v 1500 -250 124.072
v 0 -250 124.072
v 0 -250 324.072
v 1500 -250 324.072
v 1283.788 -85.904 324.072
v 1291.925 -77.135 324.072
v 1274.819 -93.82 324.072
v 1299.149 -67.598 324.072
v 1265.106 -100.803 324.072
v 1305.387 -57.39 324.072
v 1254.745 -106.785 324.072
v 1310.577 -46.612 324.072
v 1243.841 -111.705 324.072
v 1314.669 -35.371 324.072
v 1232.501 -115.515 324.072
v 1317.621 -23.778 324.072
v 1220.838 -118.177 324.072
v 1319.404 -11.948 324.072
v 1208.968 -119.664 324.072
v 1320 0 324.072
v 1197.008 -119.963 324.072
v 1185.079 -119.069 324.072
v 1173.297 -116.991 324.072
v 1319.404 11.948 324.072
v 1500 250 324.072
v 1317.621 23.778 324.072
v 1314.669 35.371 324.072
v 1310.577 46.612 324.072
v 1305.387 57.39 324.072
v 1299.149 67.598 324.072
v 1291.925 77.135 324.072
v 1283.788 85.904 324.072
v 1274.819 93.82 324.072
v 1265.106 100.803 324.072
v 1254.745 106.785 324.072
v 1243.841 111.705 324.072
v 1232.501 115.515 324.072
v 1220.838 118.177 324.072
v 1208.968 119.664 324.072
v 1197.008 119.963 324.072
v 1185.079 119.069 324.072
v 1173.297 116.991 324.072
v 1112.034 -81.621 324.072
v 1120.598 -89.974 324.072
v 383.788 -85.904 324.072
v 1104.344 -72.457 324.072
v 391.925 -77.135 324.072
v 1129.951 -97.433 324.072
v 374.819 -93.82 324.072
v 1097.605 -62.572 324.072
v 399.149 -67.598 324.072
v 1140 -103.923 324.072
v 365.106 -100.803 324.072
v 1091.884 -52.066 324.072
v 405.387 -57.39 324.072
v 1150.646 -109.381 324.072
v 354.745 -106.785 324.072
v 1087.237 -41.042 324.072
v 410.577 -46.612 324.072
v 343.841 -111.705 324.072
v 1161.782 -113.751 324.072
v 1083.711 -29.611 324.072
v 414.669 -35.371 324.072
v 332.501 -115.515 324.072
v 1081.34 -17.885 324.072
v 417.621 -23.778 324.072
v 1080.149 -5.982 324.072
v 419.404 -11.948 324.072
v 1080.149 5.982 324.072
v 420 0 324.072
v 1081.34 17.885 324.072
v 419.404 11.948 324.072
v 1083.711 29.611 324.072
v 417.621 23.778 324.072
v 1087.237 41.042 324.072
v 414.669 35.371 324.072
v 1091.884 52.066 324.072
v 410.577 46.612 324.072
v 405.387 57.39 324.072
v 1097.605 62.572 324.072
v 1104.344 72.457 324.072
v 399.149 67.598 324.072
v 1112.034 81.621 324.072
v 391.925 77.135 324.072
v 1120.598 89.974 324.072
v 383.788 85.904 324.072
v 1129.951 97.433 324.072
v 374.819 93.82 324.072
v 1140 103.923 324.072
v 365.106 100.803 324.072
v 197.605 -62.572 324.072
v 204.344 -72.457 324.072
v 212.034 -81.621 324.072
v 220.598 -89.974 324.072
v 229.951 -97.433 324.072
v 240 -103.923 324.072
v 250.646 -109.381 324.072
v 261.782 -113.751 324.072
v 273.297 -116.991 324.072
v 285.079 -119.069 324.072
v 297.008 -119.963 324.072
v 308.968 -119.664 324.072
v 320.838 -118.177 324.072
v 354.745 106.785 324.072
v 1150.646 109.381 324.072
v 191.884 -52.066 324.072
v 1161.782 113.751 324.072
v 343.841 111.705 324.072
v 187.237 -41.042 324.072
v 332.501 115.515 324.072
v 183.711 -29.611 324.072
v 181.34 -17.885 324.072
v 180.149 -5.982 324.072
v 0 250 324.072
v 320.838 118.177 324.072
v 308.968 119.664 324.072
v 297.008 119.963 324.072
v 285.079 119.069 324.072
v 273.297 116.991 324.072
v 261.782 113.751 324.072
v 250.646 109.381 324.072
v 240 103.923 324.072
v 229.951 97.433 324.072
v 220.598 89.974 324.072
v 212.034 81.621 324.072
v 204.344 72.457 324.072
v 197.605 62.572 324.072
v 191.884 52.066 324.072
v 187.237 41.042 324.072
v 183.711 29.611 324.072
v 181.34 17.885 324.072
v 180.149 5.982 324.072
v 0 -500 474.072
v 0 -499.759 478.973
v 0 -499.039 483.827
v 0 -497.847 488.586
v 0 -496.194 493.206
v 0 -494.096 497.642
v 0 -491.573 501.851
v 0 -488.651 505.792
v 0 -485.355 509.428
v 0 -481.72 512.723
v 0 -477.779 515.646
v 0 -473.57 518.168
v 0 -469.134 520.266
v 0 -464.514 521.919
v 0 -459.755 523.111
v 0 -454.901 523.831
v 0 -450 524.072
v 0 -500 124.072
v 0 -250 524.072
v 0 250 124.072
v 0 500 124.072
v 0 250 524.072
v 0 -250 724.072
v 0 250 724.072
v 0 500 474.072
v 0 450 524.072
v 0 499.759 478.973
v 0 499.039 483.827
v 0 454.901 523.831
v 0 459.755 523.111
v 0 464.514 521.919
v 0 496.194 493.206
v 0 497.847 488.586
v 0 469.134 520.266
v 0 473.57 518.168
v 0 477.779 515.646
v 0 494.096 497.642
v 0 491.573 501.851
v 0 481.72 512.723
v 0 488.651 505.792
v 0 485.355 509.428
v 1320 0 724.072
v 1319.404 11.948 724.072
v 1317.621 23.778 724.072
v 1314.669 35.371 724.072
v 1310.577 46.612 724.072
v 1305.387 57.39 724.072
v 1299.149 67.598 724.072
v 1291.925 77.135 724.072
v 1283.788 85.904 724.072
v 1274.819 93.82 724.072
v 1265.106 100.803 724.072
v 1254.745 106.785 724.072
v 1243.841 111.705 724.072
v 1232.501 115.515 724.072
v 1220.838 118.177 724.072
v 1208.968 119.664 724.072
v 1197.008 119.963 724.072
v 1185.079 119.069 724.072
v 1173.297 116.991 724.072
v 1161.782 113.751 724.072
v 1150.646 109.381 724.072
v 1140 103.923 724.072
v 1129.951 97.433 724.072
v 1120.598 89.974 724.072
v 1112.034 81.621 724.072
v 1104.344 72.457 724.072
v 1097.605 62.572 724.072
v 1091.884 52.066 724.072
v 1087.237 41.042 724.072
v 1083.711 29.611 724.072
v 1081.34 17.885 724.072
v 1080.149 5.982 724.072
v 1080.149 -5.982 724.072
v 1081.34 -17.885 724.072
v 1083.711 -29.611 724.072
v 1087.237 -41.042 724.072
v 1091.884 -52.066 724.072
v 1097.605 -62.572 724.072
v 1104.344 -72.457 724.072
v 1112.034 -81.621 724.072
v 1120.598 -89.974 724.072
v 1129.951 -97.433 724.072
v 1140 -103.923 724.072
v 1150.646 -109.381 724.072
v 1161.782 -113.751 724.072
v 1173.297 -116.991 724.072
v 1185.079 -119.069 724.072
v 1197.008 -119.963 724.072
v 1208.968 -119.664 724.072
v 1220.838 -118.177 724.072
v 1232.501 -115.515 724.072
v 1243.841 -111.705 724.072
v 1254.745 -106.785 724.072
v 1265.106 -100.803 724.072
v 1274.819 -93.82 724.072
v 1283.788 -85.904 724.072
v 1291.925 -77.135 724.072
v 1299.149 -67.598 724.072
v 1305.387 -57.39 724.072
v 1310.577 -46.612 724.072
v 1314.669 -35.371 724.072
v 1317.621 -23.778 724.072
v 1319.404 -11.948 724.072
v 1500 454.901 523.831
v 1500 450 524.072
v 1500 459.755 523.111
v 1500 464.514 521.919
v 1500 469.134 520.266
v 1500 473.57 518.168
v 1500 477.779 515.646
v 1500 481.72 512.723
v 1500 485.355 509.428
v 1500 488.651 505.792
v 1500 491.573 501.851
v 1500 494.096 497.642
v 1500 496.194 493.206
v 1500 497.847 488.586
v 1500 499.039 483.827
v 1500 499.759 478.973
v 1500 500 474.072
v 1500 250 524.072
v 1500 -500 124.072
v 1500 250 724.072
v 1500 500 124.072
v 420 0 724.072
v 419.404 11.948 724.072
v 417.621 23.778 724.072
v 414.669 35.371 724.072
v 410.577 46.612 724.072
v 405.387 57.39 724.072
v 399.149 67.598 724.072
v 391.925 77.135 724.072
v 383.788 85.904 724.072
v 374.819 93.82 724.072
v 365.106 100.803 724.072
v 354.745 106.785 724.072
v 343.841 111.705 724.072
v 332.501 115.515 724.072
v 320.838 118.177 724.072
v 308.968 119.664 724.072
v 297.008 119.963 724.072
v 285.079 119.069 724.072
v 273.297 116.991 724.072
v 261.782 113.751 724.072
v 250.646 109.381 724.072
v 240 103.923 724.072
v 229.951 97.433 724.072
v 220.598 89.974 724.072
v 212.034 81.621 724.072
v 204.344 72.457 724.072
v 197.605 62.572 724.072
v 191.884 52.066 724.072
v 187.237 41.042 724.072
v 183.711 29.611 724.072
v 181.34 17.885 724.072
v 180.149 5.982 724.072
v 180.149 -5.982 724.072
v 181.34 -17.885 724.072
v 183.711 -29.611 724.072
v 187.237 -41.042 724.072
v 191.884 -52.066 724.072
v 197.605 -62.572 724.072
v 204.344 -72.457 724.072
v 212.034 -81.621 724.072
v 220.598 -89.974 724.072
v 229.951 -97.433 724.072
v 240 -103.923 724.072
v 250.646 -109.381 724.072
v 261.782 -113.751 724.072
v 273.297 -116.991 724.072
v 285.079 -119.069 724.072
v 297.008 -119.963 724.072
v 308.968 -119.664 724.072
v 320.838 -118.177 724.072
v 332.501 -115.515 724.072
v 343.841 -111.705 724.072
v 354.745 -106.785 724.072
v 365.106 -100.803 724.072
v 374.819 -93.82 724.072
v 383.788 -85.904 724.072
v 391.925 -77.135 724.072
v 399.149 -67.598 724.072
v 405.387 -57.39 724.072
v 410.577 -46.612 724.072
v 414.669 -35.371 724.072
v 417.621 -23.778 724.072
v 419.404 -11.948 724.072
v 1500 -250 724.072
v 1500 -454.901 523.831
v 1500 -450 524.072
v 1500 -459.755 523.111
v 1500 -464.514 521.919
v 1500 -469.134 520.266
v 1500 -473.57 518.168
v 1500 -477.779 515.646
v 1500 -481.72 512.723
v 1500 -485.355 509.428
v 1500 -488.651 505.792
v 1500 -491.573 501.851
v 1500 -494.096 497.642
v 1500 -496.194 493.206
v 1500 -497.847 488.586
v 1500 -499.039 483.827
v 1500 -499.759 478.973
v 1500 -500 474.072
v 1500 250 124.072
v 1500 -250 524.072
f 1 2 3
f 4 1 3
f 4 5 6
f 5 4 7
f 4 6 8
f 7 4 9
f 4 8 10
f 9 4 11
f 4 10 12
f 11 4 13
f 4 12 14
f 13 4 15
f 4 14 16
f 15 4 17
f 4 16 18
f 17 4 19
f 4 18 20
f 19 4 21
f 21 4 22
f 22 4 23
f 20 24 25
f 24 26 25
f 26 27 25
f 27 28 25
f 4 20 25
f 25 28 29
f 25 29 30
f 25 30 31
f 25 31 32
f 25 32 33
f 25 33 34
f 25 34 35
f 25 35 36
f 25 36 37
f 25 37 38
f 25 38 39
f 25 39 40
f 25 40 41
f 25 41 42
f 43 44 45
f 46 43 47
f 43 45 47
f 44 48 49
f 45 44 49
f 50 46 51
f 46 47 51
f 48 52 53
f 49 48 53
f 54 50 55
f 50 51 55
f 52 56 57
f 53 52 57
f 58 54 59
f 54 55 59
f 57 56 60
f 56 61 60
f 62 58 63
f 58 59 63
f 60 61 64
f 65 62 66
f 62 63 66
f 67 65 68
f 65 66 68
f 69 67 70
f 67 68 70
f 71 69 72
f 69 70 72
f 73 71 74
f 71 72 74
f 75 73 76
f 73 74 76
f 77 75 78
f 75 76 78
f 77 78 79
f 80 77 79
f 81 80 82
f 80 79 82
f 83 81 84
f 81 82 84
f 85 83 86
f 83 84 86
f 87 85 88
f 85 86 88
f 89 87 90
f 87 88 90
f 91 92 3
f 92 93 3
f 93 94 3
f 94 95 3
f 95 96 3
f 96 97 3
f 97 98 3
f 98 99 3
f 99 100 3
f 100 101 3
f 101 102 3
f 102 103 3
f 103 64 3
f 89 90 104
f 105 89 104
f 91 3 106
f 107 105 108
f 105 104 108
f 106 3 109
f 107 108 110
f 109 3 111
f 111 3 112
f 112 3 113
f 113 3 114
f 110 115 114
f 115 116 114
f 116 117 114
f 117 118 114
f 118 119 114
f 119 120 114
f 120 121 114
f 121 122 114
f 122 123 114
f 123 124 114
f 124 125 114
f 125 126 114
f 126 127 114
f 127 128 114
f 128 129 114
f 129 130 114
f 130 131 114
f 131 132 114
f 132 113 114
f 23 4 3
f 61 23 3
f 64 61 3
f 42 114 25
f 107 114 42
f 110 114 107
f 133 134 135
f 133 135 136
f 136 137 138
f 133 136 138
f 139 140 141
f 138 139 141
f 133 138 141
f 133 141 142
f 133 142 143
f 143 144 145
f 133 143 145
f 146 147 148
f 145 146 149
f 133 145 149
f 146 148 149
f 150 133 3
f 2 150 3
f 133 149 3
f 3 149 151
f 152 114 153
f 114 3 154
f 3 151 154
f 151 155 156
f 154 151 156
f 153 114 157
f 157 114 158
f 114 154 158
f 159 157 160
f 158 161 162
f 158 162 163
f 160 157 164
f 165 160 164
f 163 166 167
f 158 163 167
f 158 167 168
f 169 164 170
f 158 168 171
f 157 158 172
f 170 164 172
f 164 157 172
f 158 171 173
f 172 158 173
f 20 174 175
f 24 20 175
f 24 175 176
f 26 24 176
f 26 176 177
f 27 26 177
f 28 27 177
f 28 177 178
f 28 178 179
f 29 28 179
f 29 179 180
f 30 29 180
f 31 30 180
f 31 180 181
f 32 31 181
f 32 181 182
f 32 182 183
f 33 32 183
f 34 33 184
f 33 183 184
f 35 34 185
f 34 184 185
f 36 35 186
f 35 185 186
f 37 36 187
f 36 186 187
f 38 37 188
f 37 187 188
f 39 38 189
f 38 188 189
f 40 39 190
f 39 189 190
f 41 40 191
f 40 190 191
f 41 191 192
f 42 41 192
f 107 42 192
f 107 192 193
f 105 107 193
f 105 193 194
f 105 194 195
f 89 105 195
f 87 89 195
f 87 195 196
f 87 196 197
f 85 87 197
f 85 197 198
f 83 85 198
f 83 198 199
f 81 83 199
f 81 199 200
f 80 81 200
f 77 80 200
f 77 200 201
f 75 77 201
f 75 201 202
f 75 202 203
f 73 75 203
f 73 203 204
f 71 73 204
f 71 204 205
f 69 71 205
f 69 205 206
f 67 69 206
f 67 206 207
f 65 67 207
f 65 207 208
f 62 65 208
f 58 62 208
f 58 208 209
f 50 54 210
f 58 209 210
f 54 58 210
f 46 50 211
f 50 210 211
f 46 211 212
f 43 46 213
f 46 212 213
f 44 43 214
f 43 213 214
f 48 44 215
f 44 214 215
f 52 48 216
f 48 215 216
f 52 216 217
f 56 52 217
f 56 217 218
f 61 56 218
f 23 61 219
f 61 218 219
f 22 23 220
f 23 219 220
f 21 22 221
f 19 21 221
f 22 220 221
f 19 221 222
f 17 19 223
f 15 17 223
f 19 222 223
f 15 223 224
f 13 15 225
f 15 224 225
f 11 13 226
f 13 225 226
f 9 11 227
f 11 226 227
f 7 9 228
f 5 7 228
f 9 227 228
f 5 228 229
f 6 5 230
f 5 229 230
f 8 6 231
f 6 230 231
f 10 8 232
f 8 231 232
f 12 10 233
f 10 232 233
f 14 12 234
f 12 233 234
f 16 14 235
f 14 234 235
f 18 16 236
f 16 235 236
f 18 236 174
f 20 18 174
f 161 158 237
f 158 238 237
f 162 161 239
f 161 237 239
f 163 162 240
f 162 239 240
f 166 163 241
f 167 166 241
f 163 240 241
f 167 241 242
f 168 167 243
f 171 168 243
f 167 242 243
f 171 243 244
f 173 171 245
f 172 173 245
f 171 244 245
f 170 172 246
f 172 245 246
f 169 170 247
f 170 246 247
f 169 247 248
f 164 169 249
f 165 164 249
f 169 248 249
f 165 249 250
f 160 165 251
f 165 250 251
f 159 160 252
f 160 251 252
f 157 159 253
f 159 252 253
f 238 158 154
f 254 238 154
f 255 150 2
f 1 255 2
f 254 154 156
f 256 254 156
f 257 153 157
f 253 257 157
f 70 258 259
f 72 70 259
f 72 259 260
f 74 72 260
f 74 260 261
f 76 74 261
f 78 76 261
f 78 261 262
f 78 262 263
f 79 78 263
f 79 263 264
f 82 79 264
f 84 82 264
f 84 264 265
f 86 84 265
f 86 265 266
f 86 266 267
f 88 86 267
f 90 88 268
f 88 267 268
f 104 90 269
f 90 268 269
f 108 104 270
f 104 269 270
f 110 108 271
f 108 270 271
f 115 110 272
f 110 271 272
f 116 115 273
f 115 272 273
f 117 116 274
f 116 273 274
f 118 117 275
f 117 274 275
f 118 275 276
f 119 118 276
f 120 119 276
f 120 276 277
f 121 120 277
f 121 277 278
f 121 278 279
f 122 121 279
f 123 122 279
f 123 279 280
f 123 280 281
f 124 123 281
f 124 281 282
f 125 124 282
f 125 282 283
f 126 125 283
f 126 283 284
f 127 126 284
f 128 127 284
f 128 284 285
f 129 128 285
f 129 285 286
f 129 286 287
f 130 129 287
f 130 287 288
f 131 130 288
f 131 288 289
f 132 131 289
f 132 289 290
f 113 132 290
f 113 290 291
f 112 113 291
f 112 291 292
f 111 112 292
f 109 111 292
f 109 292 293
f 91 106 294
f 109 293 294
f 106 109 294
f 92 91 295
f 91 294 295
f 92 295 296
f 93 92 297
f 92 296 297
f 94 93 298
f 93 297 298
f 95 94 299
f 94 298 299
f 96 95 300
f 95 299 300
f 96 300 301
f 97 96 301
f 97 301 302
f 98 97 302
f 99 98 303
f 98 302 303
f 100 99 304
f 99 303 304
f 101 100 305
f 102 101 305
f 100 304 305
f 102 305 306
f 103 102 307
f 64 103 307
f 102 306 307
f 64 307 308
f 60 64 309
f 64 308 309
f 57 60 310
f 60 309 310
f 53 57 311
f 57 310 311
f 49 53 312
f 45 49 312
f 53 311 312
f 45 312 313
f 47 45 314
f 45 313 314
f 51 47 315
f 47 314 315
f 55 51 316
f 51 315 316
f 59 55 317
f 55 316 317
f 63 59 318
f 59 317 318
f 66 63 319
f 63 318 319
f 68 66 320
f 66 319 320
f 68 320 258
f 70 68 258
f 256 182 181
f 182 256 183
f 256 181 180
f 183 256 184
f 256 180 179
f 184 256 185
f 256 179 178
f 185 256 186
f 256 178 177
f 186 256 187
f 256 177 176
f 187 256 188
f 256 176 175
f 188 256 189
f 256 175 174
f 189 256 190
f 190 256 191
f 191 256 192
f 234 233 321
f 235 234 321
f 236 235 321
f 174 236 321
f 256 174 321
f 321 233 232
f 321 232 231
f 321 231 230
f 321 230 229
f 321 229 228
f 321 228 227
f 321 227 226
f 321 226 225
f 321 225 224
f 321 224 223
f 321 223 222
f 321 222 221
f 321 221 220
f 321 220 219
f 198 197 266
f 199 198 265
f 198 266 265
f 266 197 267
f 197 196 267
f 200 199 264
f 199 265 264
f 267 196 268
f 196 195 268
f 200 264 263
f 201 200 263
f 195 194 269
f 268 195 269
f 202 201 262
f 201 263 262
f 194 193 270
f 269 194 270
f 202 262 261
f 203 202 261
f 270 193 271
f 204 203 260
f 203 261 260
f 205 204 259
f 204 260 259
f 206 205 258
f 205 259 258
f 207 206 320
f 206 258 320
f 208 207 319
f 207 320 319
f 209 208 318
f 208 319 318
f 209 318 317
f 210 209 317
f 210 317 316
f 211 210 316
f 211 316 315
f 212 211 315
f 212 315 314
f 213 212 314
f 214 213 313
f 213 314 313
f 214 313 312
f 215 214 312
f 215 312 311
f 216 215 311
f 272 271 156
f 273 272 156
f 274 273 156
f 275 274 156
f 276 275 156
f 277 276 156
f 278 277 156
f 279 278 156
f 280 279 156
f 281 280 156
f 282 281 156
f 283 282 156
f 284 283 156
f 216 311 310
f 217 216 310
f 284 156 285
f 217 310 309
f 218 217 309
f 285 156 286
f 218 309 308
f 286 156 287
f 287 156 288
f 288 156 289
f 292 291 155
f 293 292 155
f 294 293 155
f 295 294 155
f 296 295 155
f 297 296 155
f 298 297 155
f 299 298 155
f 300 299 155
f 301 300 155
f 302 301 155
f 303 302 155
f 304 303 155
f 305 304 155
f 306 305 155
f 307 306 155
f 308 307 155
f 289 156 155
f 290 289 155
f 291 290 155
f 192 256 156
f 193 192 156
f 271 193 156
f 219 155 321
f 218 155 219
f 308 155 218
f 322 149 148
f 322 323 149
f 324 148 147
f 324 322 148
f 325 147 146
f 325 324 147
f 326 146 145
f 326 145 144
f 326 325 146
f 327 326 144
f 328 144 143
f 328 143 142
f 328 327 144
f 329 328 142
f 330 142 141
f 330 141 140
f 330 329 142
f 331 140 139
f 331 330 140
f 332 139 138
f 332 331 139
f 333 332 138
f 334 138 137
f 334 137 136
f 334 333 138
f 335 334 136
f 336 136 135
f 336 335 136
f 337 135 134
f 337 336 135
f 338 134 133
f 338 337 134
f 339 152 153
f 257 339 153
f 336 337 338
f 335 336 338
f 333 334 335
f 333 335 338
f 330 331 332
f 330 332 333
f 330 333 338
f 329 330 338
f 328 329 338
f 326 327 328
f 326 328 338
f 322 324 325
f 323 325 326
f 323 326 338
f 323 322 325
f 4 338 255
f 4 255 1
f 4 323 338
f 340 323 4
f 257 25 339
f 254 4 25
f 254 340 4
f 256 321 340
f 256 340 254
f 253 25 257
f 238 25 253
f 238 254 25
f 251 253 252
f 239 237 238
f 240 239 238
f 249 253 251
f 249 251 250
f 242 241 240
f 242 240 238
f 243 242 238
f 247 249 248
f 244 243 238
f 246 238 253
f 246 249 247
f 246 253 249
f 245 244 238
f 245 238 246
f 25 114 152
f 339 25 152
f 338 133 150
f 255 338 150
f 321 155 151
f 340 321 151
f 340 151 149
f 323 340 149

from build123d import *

# Parameters (mm, degrees)
F1_DEPTH = 1500
F2_R     = 120
F3_DEPTH = 715
F4_R     = 50


with BuildPart() as f1:
    # F0 (on Right) → F1 (new body)
    with BuildSketch(Plane.YZ):
        Polygon((250, 724.072175), (0, 724.072175), (-250, 724.072175), (-250, 524.072175), (-500, 524.072175), (-500, 124.072175), (-250, 124.072175), (-250, 324.072175), (0, 324.072175), (250, 324.072175), (250, 124.072175), (500, 124.072175), (500, 524.072175), (250, 524.072175), align=None)
    extrude(amount=F1_DEPTH)

    # F2 (on face) → F3 (cut)
    with BuildSketch(Plane.XY.offset(724.072175)):
        with Locations((300, 0)):
            Circle(F2_R)
        with Locations((1200, 0)):
            Circle(F2_R)
    extrude(amount=-F3_DEPTH, mode=Mode.SUBTRACT)

    # F4
    f4_edges = [f1.edges().sort_by_distance(p)[0] for p in [
        (750, -500, 524.072175),
        (750, 500, 524.072175),
    ]]
    fillet(f4_edges, radius=F4_R)


solid = f1.part
